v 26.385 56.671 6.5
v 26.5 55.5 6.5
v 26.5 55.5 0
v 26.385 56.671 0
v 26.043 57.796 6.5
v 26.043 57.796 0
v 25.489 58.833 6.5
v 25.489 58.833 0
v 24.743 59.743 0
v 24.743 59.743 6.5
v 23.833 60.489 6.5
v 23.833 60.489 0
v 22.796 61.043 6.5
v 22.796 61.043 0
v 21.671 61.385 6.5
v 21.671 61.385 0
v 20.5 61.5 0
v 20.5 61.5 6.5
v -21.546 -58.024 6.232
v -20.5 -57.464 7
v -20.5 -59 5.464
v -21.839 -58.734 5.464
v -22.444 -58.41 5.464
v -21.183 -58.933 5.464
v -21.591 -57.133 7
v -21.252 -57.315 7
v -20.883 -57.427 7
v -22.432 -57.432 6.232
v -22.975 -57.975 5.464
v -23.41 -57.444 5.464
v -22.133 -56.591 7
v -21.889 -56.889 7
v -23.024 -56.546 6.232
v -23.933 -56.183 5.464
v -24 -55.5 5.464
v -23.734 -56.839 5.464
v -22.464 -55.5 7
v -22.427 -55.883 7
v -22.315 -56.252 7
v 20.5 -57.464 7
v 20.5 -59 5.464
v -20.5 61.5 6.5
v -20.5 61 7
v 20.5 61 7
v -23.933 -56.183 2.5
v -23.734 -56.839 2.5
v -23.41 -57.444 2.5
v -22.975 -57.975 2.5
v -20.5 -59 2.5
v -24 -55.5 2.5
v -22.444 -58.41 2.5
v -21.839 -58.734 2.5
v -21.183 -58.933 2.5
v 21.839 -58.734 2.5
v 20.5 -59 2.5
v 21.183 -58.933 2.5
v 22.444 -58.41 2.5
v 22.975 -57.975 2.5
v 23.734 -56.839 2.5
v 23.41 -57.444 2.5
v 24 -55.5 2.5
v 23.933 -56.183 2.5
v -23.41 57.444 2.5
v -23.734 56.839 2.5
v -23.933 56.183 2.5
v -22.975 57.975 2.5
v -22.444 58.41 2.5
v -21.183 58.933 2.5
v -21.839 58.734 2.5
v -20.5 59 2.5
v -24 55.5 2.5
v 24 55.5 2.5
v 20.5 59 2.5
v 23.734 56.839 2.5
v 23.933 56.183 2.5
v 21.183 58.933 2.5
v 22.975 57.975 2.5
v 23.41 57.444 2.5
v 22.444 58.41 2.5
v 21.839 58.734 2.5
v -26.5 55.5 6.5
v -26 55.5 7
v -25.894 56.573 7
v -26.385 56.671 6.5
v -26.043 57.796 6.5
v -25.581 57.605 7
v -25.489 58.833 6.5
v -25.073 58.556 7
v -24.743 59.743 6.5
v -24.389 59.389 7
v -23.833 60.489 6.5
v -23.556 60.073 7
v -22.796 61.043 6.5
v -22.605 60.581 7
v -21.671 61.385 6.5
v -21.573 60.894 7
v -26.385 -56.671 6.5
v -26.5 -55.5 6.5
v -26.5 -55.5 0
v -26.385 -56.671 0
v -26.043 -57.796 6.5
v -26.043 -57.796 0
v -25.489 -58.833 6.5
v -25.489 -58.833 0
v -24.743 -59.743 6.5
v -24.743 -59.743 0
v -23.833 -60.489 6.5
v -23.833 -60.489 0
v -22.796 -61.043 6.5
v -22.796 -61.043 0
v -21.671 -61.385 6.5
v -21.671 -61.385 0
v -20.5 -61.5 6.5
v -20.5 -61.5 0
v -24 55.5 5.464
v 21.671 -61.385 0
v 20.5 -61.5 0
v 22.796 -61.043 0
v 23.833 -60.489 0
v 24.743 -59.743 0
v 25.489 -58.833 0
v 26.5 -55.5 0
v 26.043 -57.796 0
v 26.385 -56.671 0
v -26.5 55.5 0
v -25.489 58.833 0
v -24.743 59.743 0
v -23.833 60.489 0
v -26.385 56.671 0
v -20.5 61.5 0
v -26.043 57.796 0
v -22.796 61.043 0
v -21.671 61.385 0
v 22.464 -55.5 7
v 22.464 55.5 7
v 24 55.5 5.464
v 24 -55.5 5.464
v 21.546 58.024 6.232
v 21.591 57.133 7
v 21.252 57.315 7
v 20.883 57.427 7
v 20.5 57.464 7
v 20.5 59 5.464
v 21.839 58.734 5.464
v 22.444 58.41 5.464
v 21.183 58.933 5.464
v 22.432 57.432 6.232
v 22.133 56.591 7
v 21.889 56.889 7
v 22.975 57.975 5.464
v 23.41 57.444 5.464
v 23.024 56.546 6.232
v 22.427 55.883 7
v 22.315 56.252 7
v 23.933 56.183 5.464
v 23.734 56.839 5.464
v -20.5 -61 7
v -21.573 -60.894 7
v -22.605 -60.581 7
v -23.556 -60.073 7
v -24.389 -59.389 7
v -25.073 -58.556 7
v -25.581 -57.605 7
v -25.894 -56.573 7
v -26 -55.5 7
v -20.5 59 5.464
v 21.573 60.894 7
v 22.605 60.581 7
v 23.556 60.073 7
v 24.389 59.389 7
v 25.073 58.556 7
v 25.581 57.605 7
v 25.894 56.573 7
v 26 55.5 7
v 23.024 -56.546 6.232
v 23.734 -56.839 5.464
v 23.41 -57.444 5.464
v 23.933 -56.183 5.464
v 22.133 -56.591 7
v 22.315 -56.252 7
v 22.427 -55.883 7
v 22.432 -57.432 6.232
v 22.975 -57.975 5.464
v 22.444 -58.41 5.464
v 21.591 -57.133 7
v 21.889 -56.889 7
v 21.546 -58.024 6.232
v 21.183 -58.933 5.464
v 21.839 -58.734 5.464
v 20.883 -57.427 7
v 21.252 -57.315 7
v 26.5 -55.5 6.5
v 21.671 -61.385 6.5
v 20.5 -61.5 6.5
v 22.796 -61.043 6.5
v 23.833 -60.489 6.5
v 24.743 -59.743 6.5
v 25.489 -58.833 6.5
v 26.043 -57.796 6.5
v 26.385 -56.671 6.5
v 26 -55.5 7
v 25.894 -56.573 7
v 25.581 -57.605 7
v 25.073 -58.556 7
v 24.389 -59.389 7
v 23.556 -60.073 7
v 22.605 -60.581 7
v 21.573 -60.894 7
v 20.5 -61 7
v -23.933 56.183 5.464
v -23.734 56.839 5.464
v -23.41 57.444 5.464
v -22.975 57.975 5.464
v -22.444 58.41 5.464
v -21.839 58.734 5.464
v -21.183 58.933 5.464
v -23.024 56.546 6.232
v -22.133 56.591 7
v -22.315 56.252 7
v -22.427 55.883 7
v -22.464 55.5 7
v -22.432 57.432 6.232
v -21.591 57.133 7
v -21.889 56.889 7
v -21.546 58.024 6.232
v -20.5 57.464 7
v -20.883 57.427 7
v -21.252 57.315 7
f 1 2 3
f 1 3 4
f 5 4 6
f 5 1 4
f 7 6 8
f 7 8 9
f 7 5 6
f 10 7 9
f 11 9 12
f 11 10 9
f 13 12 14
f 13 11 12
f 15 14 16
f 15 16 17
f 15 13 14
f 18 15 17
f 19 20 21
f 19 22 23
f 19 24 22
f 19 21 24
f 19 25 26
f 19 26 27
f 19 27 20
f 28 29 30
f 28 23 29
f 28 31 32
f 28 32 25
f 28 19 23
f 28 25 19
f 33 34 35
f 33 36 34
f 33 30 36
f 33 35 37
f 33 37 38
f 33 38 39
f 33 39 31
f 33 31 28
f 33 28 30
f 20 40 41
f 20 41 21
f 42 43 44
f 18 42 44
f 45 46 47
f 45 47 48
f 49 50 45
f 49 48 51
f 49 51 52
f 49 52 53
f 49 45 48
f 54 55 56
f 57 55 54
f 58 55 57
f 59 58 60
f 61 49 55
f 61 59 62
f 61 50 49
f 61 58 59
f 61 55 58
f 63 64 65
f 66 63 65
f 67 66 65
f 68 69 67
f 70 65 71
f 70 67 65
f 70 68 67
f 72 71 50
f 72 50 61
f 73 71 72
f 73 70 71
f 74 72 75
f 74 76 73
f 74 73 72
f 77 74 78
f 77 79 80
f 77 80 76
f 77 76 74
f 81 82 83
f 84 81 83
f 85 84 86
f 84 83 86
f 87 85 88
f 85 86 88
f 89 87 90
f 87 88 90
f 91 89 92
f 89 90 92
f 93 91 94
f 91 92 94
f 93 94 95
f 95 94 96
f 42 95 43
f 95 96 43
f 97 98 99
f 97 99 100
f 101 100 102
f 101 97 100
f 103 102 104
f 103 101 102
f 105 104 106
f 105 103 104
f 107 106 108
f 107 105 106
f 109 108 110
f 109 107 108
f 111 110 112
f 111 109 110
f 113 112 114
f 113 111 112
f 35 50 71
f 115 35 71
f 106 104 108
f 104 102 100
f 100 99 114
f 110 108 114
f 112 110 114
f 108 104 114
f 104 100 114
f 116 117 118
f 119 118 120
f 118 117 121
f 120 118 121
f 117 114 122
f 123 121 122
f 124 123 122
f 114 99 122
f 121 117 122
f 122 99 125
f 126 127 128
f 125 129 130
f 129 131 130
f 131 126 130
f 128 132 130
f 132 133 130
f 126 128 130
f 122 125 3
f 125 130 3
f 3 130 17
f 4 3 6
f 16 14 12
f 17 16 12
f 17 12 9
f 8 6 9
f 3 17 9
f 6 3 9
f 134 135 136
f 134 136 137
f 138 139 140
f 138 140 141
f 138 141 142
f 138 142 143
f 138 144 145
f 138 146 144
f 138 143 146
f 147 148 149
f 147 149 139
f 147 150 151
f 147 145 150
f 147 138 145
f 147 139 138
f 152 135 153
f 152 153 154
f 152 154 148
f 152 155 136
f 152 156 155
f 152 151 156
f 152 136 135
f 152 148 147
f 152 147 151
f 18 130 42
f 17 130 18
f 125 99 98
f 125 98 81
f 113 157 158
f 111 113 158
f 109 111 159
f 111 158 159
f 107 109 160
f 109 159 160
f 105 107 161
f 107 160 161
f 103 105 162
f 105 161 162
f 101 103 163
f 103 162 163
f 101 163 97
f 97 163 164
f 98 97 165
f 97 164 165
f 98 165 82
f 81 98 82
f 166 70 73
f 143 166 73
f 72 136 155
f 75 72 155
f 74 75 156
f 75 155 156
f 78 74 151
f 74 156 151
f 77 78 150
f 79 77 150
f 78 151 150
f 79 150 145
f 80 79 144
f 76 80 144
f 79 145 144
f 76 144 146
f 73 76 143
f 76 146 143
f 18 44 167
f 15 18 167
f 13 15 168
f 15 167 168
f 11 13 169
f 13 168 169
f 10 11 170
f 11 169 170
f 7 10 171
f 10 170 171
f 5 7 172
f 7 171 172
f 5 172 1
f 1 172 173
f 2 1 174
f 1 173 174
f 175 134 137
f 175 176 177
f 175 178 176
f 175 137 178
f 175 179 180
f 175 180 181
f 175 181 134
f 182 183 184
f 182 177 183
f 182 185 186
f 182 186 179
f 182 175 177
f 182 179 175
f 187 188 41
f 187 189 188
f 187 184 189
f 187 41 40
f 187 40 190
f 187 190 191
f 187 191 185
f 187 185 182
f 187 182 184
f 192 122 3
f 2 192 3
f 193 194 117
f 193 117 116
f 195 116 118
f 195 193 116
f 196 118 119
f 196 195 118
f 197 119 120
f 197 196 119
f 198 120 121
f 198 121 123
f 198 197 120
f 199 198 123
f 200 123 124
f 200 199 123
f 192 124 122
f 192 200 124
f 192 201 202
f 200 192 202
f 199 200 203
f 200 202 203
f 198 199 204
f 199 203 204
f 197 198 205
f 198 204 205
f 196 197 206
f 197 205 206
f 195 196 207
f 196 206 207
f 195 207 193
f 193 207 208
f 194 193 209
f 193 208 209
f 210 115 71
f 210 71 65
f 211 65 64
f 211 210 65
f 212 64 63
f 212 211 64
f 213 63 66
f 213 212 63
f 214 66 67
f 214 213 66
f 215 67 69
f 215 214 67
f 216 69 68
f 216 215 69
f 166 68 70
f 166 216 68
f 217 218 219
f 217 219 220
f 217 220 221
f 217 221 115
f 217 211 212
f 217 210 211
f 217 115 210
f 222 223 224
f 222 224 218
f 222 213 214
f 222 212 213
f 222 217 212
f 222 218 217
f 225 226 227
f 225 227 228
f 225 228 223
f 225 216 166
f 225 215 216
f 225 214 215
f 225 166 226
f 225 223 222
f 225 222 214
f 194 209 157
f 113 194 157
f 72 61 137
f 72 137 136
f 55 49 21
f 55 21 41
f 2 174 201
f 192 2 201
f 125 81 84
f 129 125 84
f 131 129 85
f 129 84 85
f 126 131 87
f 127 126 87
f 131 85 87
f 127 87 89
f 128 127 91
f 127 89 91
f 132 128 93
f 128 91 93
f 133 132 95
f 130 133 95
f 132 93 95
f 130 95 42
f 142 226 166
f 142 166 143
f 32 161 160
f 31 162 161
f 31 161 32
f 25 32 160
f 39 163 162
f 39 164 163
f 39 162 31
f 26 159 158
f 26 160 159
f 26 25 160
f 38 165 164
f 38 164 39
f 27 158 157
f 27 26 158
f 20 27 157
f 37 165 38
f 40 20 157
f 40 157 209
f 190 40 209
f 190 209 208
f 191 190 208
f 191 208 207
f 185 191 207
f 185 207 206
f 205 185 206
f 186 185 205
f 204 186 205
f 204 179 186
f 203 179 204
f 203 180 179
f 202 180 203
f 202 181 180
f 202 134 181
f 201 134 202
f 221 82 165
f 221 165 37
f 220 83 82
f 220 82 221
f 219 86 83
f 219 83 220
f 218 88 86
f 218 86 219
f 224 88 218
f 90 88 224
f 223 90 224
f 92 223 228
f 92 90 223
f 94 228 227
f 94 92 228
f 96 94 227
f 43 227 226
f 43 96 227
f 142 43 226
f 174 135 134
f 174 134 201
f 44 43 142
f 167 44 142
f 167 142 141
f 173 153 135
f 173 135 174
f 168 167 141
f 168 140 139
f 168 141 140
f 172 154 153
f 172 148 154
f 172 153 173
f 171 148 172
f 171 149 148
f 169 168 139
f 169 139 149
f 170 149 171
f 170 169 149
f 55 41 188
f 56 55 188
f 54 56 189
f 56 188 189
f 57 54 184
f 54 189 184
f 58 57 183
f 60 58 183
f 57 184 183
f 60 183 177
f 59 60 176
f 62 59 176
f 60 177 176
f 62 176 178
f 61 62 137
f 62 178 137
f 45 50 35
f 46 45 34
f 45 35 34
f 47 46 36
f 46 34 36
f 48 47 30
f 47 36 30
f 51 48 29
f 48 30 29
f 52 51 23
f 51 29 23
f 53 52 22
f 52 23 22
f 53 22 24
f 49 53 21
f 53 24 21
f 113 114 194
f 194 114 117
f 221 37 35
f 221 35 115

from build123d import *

# Parameters (mm, degrees)
F0_W     = 53
F0_H     = 123
F1_DEPTH = 7
F2_R     = 6
F3_SIZE  = 0.5
F4_T     = -2.5


with BuildPart() as f1:
    # F0 (on Top) → F1 (new body)
    with BuildSketch(Plane.XY):
        Rectangle(F0_W, F0_H)
    extrude(amount=F1_DEPTH)

    # F2
    f2_edges = [f1.edges().sort_by_distance(p)[0] for p in [
        (26.5, 61.5, 3.5),
        (-26.5, 61.5, 3.5),
        (26.5, -61.5, 3.5),
        (-26.5, -61.5, 3.5),
    ]]
    fillet(f2_edges, radius=F2_R)

    # F3
    f3_edges = [f1.edges().sort_by_distance(p)[0] for p in [
        (-26.5, 0, 7),
        (-24.742641, -59.742641, 7),
        (0, -61.5, 7),
        (24.742641, -59.742641, 7),
        (26.5, 0, 7),
        (24.742641, 59.742641, 7),
        (0, 61.5, 7),
        (-24.742641, 59.742641, 7),
    ]]
    chamfer(f3_edges, length=F3_SIZE)

    # F4
    f4_openings = [f1.faces().sort_by_distance(p)[0] for p in [
        (0, 0, 7),
    ]]
    offset(amount=F4_T, openings=f4_openings)


solid = f1.part
